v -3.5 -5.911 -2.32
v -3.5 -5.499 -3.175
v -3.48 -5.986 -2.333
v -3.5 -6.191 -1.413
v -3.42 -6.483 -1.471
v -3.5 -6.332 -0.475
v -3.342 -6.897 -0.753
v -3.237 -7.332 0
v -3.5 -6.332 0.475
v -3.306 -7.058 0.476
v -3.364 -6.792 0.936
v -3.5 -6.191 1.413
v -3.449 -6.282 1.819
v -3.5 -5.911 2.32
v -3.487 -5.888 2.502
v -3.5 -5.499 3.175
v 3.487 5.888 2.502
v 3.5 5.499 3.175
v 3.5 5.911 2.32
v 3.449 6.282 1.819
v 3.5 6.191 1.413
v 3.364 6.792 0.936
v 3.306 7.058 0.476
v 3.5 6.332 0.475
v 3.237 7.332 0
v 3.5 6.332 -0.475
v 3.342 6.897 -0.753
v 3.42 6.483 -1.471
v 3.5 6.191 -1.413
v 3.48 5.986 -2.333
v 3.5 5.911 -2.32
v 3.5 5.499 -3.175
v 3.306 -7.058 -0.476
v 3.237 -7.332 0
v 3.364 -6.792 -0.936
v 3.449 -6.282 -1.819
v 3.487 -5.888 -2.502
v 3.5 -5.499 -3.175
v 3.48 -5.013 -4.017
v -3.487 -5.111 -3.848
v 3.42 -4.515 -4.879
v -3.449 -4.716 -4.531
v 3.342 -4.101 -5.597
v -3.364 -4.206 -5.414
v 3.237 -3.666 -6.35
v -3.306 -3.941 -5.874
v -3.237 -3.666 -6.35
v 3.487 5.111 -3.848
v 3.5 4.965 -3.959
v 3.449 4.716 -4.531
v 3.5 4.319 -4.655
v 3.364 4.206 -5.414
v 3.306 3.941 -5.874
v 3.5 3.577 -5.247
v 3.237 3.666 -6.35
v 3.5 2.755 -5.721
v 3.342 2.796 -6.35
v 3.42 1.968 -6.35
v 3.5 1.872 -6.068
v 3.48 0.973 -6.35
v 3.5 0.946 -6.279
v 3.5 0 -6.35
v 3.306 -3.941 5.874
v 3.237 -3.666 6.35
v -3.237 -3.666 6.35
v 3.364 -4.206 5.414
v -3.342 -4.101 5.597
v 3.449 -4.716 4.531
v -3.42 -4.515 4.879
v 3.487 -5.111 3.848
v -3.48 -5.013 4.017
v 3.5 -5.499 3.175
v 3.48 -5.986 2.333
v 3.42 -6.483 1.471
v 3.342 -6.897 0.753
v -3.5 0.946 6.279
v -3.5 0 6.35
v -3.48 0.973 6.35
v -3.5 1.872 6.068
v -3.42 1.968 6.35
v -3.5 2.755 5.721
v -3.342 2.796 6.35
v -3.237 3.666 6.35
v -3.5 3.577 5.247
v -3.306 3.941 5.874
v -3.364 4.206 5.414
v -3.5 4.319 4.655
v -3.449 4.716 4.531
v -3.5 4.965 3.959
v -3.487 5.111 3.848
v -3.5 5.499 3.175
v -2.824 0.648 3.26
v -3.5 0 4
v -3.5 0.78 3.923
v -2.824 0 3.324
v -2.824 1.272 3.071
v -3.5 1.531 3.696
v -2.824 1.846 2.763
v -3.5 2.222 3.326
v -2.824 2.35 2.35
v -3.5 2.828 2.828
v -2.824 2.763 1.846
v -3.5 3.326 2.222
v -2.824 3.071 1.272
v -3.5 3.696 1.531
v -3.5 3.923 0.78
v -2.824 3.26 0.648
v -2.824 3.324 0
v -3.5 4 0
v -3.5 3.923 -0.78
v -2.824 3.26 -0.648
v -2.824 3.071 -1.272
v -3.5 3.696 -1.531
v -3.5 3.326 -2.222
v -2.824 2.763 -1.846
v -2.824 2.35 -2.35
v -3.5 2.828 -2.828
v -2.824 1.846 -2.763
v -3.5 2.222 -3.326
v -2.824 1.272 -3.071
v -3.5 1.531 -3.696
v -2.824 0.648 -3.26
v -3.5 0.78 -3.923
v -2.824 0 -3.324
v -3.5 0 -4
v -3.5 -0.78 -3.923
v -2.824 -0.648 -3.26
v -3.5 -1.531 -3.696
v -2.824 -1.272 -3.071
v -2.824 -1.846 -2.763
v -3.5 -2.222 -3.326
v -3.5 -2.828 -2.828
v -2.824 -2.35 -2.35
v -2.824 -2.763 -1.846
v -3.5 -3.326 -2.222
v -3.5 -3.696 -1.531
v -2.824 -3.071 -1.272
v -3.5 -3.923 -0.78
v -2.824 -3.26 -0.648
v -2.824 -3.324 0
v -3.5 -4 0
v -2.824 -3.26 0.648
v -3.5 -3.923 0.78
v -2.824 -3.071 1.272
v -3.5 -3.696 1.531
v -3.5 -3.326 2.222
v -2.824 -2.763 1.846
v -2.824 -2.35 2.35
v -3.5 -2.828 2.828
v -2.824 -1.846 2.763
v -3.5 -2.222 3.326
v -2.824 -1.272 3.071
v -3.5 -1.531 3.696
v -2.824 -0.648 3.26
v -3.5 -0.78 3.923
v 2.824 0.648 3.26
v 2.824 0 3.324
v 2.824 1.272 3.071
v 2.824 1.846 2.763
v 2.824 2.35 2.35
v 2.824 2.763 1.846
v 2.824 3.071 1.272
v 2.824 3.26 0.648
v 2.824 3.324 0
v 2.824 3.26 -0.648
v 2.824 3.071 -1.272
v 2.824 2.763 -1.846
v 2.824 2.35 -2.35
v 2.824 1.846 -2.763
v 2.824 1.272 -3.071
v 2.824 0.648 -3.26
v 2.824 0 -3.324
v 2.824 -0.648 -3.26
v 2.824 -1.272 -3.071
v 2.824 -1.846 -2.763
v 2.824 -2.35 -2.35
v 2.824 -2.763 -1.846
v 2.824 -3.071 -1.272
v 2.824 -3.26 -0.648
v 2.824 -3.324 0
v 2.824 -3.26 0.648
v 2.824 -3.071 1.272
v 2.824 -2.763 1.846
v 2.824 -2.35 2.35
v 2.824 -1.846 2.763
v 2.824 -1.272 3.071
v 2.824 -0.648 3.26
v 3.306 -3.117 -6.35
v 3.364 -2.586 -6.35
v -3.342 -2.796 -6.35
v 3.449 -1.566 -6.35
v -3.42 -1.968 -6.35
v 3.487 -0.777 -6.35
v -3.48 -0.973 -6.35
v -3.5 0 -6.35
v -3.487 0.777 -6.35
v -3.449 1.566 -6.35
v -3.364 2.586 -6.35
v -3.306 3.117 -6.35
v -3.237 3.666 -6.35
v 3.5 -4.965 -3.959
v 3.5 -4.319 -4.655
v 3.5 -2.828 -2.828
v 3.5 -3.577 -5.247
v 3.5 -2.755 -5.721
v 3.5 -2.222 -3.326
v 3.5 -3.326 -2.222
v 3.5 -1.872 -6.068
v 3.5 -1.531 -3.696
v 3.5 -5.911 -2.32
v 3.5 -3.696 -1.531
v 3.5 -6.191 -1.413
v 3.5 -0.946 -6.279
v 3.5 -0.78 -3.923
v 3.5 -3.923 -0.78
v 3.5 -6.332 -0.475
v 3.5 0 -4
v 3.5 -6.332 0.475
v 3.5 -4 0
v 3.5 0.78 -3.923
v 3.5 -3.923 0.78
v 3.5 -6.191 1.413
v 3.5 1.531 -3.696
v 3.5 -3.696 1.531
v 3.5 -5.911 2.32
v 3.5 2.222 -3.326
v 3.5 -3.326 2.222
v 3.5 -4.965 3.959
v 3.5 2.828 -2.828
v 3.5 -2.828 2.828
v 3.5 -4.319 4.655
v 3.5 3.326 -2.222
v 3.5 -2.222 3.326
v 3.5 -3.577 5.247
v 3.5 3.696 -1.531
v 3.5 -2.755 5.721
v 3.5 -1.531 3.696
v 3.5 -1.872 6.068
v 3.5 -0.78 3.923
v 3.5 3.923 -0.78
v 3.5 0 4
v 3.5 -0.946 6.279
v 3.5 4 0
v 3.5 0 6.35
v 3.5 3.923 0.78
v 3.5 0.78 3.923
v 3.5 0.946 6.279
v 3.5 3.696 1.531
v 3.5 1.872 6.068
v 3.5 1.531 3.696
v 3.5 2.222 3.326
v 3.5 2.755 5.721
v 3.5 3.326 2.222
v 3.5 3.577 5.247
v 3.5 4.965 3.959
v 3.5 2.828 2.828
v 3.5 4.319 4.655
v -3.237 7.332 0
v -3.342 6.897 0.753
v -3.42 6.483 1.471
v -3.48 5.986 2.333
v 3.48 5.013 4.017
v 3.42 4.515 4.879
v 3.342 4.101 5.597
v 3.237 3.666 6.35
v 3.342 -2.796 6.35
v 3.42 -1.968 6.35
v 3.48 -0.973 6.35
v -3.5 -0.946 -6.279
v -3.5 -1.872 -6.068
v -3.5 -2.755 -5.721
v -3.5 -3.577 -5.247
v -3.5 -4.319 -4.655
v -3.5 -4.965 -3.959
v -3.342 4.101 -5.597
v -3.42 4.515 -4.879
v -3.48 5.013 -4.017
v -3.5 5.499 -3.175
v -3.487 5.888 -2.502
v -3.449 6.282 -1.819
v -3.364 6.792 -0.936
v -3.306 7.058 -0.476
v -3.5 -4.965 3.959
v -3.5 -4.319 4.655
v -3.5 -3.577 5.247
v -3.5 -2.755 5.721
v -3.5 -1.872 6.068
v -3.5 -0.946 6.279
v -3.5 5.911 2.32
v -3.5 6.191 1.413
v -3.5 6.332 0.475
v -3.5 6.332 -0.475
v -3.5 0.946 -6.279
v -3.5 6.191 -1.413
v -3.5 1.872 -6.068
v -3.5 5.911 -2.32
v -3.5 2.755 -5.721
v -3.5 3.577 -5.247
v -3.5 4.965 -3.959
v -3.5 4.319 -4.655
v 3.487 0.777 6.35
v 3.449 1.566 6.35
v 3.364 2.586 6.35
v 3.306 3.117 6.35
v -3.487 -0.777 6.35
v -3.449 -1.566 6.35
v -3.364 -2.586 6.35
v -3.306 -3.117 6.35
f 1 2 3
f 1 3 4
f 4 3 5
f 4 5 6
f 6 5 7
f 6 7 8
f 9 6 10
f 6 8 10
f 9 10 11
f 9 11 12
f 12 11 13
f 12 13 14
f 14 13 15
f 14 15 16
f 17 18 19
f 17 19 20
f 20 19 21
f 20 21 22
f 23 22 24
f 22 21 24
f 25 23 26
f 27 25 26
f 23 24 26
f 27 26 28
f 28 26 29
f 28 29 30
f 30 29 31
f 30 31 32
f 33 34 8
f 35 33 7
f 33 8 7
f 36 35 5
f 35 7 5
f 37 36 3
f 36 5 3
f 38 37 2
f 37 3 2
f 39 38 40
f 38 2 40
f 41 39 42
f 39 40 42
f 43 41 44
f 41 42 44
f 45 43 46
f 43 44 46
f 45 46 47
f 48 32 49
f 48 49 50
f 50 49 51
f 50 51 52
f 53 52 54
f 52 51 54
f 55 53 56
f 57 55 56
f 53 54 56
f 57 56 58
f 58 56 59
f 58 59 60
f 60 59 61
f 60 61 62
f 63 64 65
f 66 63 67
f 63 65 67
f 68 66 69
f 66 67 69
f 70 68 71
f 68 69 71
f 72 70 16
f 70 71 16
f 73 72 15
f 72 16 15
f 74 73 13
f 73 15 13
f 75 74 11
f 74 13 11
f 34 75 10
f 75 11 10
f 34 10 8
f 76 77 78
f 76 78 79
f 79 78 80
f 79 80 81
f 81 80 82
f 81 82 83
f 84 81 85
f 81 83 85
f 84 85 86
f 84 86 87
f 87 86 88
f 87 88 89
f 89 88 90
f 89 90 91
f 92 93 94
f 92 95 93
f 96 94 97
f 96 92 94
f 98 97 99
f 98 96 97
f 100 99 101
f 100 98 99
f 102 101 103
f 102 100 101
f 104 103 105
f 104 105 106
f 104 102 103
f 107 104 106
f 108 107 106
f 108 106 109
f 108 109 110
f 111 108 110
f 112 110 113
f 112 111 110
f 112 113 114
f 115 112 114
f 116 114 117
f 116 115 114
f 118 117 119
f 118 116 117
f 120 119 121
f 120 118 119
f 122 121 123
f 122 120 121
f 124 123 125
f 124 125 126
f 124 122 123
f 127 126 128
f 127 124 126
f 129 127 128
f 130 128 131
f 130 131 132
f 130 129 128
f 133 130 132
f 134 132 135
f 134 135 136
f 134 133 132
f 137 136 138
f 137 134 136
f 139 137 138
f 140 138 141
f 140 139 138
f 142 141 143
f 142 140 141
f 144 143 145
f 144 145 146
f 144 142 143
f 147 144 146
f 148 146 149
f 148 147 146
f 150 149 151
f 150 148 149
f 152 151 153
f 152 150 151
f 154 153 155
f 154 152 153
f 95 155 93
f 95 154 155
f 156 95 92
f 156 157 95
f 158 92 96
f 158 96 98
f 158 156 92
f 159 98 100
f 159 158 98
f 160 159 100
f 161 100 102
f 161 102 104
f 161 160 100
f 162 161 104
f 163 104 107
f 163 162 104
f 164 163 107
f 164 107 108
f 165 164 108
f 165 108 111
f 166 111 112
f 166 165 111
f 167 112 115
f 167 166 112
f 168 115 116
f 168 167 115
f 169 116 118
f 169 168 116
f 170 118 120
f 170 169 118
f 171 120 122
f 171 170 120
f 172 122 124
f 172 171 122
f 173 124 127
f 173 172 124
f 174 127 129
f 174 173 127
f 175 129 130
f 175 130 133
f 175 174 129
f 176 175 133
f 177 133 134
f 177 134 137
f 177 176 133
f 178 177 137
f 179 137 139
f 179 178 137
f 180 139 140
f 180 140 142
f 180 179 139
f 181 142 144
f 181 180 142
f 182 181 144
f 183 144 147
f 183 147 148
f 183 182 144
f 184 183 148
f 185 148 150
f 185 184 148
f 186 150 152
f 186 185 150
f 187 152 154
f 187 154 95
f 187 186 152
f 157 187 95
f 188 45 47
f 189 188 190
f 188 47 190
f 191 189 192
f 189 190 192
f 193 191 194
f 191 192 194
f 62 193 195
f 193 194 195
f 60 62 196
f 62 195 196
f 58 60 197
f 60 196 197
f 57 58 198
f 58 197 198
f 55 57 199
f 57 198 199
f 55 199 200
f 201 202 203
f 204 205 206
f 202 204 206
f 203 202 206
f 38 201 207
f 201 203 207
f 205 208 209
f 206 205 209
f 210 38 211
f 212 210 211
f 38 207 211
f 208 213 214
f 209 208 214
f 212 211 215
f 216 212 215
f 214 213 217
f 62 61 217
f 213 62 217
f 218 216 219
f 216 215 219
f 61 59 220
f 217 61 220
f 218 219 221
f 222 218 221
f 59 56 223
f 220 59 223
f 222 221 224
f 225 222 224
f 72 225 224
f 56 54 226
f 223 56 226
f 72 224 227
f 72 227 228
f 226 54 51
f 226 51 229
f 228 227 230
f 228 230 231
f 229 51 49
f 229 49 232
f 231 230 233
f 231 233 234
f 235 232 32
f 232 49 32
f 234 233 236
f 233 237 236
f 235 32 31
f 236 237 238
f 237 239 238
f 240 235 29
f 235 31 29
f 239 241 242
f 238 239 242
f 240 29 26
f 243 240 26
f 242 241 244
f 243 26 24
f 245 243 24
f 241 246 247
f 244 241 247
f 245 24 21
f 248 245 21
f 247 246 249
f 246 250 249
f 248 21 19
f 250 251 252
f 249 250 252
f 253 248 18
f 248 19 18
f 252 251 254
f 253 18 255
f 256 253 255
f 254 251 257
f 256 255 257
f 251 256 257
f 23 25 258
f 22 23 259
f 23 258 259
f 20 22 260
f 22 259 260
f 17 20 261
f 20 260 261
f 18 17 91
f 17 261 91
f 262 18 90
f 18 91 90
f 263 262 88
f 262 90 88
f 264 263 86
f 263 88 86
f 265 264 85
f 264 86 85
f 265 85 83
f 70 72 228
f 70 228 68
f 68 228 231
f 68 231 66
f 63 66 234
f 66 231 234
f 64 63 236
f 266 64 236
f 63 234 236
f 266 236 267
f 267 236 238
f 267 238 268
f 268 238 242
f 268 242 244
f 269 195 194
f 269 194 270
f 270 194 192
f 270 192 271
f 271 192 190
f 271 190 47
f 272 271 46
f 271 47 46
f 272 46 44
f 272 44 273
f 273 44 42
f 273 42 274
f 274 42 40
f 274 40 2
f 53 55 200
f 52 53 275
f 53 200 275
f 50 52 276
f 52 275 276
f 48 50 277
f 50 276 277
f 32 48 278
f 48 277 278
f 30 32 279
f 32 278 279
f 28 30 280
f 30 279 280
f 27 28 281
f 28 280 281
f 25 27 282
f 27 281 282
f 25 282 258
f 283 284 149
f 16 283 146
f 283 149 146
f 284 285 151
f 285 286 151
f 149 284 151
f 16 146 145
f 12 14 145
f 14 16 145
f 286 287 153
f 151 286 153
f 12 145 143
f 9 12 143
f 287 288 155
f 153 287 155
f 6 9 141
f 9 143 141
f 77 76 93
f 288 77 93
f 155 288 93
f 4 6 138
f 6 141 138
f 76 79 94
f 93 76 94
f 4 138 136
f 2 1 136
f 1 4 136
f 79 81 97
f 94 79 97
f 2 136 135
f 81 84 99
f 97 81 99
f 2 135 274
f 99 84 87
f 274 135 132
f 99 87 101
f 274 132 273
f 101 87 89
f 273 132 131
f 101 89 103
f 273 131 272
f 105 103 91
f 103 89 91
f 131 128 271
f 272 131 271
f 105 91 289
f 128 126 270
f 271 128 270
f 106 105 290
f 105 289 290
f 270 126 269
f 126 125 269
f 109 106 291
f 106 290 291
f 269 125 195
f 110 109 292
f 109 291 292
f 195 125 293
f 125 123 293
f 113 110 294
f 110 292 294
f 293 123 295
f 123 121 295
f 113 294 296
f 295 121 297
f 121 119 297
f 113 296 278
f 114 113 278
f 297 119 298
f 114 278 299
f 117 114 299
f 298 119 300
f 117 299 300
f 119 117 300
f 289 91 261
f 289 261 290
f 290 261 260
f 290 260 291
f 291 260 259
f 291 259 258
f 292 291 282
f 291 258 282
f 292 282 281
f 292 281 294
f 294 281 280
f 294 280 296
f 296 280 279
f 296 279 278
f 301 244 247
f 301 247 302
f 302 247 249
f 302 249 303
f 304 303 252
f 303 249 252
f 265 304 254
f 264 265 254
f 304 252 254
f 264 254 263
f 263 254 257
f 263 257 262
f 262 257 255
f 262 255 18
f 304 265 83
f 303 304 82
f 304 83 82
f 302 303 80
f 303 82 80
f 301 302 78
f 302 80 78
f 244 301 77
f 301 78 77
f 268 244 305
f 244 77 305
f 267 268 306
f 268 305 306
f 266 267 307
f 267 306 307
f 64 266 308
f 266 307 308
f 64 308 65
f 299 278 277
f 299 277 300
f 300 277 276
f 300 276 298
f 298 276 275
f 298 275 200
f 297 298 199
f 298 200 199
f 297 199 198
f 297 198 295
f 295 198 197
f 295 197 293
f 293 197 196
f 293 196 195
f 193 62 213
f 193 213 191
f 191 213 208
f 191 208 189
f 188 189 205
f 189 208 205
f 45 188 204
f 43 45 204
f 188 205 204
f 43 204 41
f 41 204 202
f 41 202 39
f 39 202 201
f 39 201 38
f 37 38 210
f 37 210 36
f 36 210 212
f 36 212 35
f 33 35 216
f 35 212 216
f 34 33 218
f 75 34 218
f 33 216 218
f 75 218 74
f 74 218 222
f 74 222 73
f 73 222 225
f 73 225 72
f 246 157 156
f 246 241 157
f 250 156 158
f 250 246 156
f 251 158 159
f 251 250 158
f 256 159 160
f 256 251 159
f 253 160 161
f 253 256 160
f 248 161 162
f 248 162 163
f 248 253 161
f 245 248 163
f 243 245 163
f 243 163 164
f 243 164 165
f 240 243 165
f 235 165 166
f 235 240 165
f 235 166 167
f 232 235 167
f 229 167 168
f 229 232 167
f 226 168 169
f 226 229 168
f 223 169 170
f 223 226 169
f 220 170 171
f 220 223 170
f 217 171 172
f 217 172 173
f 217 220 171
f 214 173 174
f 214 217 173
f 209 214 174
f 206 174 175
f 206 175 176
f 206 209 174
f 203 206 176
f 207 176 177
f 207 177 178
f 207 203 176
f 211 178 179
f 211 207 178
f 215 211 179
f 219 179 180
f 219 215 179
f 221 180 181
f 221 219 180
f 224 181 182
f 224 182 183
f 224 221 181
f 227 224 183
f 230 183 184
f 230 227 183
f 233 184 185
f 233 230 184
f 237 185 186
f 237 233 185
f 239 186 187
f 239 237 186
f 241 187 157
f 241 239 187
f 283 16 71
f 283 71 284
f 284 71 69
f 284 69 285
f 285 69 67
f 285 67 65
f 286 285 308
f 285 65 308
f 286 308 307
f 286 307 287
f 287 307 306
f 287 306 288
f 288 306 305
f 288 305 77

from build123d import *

# Parameters (mm, degrees)
CUT_EXTRUDE_1_DEPTH      = 3.5
CUT_EXTRUDE_1_DEPTH_BACK = 3.5
SKETCH_3_W               = 25.4
SKETCH_3_H               = 25.4


with BuildPart() as part:
    # 草图1 → 旋转1 (revolve)
    with BuildSketch(Plane.XY):
        Polygon((-3.5, 0), (-3.5, 6.35), (-2.844596275, 8.796), (2.844596275, 8.796), (3.5, 6.35), (3.5, 0), align=None)
    revolve(axis=Axis((3.5, 0, 0), (-1, 0, 0)))

    # 草图2 → 切除-旋转1 (revolve, cut)
    with BuildSketch(Plane.XY):
        Polygon((-3.5, 0), (-3.5, 4), (-2.8235, 3.3235), (2.8235, 3.3235), (3.5, 4), (3.5, 0), align=None)
    revolve(axis=Axis((3.5, 0, 0), (-1, 0, 0)), mode=Mode.SUBTRACT)

    # 草图3 → 切除-拉伸1 (cut, two sides: drawn at the far end of the back side and taken through both)
    with BuildSketch(Plane(origin=(0, 0, 0), x_dir=(0, 0, -1), z_dir=(1, 0, 0)).offset(-CUT_EXTRUDE_1_DEPTH_BACK)):
        Rectangle(SKETCH_3_W, SKETCH_3_H)
        Polygon((-6.35, 3.666174209), (-6.35, -3.666174209), (0, -7.332348419), (6.35, -3.666174209), (6.35, 3.666174209), (0, 7.332348419), align=None, mode=Mode.SUBTRACT)
    extrude(amount=CUT_EXTRUDE_1_DEPTH + CUT_EXTRUDE_1_DEPTH_BACK, mode=Mode.SUBTRACT)


solid = part.part
